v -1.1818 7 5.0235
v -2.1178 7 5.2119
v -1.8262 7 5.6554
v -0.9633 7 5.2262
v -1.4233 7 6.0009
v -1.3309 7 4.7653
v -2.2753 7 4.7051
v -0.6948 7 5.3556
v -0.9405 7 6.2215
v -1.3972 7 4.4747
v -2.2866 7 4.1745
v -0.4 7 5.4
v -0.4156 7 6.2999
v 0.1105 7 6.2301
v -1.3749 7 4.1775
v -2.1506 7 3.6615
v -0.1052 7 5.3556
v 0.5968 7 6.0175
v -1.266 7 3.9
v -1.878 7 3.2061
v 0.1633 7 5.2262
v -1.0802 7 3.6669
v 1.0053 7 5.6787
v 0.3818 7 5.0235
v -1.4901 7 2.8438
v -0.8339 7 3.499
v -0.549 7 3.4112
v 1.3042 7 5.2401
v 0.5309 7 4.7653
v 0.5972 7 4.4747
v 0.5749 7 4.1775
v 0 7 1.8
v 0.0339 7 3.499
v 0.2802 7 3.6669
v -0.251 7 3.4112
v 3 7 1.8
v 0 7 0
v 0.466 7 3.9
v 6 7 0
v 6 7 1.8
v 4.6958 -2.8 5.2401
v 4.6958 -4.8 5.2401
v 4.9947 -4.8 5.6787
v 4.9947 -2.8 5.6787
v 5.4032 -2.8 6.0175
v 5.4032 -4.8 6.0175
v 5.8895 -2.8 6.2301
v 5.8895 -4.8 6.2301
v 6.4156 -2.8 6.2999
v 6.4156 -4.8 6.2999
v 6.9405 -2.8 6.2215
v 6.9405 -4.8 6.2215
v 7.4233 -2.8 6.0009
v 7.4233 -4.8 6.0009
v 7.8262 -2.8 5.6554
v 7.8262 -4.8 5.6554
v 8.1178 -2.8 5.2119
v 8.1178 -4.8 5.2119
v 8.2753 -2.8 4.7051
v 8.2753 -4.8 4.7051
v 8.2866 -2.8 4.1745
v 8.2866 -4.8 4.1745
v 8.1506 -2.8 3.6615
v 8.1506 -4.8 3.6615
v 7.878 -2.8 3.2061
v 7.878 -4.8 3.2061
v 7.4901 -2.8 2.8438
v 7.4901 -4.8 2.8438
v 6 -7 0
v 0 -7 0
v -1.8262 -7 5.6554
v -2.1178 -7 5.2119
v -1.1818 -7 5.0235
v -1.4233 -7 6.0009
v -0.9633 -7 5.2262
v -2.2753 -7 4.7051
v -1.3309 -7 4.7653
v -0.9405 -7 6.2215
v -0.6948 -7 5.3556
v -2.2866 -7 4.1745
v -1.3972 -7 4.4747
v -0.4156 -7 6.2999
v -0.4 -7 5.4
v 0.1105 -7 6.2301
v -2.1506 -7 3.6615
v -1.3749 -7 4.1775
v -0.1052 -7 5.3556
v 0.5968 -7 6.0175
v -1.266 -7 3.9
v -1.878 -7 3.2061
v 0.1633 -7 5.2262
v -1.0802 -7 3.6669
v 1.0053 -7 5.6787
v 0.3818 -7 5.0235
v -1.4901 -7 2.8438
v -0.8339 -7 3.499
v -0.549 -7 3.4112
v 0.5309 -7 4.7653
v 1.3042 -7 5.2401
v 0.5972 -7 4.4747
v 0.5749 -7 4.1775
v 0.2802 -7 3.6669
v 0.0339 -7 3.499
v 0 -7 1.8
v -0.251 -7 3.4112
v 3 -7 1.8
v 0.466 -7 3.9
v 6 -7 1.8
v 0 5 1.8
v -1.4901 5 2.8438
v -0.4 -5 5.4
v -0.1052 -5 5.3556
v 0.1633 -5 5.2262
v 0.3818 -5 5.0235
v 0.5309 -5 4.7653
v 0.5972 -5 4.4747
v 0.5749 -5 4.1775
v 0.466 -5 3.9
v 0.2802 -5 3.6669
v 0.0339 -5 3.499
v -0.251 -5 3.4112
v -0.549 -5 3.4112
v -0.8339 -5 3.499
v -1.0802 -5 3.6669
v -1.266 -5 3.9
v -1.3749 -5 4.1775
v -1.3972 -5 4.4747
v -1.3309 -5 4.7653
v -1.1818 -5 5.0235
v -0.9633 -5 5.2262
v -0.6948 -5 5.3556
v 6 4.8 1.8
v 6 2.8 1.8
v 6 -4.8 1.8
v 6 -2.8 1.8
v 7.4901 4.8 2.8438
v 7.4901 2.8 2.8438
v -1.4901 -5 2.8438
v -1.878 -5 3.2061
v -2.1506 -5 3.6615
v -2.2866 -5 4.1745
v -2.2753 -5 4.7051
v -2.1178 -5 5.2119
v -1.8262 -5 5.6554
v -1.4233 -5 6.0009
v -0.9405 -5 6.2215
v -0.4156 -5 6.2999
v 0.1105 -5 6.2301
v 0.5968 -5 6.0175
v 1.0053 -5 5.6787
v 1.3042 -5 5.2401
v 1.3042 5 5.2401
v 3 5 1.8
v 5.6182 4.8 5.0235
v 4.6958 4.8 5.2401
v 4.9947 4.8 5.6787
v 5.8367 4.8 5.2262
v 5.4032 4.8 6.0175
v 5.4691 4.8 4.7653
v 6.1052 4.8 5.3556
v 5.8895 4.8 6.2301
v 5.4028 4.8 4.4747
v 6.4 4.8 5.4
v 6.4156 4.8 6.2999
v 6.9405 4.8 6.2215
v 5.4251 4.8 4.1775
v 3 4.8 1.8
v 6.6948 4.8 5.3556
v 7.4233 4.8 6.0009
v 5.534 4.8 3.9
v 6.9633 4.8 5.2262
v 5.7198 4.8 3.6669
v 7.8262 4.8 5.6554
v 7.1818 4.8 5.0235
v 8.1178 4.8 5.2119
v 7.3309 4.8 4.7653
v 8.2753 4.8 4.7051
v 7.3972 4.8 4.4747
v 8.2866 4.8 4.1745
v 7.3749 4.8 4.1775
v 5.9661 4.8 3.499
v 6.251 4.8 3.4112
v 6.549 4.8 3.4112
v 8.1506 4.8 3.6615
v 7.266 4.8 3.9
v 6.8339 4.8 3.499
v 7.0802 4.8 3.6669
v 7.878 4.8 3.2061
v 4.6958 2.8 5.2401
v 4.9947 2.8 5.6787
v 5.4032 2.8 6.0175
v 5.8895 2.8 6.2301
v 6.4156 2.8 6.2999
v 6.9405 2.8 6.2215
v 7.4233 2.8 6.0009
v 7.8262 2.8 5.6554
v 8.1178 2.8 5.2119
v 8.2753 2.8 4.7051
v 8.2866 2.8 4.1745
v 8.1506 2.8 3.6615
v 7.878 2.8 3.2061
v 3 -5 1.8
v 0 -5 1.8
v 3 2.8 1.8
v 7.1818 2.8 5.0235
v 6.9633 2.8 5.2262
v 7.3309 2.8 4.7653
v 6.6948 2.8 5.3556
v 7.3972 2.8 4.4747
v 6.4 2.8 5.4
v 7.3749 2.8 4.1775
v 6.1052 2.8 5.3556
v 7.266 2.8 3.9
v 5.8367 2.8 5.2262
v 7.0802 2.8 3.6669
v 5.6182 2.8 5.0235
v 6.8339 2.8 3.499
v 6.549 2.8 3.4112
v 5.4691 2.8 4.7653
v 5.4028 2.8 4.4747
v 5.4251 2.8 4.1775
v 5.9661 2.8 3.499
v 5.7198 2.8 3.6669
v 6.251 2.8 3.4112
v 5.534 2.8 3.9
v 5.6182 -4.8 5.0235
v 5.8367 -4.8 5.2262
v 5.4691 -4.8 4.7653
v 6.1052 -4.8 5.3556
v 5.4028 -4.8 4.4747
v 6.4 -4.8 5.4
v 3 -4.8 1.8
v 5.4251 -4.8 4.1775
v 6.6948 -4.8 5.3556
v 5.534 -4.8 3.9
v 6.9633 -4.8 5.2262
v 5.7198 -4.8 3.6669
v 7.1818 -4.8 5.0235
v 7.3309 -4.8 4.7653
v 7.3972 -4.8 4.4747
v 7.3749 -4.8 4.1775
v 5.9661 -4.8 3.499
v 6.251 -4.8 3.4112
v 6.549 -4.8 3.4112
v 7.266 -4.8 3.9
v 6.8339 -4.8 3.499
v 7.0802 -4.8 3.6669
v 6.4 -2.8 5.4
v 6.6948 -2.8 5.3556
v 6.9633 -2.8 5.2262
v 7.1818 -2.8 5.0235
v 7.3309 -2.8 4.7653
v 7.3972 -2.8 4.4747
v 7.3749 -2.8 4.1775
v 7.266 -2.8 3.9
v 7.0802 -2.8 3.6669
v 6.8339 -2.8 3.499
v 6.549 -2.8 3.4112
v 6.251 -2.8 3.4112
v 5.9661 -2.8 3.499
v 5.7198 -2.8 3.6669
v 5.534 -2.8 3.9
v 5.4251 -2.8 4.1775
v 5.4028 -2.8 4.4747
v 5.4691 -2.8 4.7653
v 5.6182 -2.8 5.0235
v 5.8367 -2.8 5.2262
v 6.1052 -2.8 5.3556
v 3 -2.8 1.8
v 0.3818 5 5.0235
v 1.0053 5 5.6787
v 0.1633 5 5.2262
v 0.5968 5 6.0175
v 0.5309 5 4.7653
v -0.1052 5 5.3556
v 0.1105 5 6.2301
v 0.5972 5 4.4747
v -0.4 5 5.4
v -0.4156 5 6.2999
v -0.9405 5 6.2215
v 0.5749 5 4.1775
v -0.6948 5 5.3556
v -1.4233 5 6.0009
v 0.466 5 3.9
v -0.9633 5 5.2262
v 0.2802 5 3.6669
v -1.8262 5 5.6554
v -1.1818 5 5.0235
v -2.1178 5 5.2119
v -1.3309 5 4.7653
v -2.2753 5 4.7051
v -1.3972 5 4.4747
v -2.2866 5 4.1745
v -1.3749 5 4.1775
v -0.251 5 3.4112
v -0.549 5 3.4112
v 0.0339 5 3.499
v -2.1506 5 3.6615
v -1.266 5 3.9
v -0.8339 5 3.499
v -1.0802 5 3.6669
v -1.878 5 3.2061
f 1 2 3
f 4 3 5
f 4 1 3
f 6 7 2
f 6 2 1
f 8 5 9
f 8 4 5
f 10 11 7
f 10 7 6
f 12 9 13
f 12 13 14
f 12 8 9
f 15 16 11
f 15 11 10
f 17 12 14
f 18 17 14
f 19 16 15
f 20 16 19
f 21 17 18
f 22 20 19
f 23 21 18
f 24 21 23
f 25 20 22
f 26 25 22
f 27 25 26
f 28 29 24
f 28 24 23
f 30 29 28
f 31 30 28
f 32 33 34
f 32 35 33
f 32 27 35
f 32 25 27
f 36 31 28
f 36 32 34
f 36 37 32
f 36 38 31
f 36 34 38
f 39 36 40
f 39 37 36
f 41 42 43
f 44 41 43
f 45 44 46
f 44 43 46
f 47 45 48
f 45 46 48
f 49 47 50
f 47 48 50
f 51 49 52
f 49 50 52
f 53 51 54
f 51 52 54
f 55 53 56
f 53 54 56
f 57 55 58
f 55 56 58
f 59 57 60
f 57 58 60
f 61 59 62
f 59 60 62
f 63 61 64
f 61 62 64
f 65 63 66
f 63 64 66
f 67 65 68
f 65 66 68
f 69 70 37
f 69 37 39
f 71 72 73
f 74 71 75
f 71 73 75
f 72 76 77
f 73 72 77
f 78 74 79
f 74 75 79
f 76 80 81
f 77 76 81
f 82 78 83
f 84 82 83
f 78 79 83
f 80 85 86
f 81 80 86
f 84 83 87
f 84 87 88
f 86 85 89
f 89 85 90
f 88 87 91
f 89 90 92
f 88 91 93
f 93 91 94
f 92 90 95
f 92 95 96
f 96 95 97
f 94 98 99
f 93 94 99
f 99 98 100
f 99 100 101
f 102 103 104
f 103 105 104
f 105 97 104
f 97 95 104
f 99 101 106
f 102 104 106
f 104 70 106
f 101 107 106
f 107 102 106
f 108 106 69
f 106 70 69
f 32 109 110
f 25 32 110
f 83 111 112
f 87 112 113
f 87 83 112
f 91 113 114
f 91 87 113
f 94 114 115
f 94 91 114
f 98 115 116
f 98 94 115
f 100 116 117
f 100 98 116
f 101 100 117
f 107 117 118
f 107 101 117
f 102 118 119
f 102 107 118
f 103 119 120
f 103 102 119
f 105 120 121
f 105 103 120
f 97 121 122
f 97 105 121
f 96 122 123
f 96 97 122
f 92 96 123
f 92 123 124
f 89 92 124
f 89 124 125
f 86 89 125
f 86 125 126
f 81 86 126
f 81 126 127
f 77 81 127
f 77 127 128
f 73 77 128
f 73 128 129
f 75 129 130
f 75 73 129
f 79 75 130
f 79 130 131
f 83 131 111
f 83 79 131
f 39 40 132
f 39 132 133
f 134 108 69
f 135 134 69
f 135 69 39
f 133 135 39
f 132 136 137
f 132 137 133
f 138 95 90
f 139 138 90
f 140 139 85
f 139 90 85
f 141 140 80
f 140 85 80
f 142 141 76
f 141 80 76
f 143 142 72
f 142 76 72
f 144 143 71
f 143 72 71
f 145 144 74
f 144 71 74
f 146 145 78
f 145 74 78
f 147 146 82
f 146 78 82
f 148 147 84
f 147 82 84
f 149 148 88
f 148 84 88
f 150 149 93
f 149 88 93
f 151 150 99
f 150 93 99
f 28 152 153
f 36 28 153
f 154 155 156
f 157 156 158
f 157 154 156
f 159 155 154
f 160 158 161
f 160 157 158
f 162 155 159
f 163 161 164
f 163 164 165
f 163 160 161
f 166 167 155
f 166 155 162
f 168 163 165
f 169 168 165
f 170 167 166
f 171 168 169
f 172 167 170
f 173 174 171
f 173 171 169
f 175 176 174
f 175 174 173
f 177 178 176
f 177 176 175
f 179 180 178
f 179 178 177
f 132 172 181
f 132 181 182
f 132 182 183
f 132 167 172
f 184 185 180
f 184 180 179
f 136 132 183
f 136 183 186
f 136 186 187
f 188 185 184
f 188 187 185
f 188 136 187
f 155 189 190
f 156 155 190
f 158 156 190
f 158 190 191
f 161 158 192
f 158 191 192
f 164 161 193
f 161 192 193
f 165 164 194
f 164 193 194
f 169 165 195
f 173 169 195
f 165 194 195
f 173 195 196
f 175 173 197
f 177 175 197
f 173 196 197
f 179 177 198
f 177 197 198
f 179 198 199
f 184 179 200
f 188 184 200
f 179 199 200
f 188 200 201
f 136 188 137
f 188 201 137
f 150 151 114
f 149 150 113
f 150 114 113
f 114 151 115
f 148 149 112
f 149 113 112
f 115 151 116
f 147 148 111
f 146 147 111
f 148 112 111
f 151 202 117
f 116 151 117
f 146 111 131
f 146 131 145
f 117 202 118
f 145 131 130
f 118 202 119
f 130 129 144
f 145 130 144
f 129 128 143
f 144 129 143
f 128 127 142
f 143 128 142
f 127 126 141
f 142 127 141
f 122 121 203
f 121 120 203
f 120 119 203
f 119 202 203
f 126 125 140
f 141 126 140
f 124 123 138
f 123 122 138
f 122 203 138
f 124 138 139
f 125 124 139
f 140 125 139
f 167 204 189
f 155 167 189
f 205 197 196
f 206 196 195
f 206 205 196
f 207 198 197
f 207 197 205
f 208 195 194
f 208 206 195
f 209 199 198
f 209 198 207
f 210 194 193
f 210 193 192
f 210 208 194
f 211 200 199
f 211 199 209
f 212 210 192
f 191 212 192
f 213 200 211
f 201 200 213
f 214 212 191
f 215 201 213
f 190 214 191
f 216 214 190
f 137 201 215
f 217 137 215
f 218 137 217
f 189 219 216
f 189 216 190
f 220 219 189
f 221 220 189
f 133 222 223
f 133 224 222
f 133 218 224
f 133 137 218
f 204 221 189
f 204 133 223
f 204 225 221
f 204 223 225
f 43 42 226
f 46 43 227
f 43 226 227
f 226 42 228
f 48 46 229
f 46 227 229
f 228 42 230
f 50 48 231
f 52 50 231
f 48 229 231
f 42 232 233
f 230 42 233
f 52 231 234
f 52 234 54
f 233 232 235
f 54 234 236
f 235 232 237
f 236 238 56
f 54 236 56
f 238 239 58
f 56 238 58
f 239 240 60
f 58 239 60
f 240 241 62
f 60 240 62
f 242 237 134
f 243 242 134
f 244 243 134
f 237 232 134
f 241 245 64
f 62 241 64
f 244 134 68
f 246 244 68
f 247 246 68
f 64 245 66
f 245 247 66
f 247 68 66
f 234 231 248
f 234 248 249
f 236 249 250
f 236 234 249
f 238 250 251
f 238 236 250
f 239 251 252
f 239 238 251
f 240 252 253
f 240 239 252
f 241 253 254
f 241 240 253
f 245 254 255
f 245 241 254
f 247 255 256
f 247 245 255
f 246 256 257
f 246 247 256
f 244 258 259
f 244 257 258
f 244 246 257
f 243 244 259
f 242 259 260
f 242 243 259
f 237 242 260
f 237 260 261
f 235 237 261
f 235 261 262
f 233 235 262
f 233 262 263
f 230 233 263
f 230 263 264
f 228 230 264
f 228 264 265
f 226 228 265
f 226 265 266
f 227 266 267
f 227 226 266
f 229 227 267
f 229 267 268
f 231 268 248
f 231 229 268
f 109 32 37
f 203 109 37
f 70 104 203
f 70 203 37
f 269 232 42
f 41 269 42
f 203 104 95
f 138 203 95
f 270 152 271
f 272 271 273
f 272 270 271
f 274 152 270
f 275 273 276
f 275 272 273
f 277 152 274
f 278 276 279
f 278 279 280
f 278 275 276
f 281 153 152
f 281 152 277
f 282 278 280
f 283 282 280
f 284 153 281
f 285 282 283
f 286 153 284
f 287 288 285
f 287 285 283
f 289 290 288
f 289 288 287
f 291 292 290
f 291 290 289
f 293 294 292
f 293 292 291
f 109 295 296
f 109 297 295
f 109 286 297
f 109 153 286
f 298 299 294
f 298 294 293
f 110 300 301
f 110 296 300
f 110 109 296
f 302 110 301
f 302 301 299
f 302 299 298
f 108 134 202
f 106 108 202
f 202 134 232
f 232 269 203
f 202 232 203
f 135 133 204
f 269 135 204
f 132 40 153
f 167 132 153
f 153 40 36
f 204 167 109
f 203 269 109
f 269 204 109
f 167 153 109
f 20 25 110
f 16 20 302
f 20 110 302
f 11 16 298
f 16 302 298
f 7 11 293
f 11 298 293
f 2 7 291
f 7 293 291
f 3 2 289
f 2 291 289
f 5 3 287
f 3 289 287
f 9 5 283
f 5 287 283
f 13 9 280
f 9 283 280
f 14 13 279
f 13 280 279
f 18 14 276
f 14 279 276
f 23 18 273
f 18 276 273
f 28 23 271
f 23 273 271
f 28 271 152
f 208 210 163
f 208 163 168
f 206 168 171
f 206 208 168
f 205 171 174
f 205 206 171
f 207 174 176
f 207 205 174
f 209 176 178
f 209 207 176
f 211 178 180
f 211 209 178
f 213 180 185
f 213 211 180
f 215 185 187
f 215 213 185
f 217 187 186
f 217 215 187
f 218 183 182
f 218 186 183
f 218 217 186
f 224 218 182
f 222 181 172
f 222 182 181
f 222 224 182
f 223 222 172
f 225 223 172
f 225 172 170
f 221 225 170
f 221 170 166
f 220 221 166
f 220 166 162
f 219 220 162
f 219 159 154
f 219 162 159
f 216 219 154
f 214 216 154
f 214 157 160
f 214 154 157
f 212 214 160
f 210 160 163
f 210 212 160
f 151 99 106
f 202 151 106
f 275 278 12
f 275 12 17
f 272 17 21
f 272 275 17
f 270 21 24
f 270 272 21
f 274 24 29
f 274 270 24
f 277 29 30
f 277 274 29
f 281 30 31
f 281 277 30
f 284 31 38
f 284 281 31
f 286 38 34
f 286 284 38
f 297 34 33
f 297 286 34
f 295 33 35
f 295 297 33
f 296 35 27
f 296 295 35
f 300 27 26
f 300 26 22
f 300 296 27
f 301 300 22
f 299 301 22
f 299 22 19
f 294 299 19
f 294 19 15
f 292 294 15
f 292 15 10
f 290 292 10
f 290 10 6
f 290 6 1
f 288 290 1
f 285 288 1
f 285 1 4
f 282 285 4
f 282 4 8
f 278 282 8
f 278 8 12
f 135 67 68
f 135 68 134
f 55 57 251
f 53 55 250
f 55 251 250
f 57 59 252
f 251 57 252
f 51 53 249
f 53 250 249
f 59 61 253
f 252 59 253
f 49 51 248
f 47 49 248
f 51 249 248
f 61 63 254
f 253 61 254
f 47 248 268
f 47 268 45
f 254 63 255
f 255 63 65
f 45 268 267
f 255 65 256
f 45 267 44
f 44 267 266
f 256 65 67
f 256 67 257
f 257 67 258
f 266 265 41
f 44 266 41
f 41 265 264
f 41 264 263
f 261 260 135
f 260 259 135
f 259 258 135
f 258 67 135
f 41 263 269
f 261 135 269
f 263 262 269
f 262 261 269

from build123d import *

# Parameters (mm, degrees)
EXTRUDE_1_DEPTH          = 7
EXTRUDE_1_DEPTH_BACK     = 7
SKETCH_1_R               = 1
CUT_EXTRUDE_1_DEPTH      = 5
CUT_EXTRUDE_1_DEPTH_BACK = 5
CUT_EXTRUDE_2_DEPTH      = 2.8
CUT_EXTRUDE_2_DEPTH_BACK = 2.8
CUT_EXTRUDE_START        = -2.2
CUT_EXTRUDE_3_DEPTH      = 2.2


with BuildPart() as part:
    # 草图1 → 凸台-拉伸1 (new, two sides: drawn at the far end of the back side and taken through both)
    with BuildSketch(Plane(origin=(0, 0, 0), x_dir=(1, 0, 0), z_dir=(0, 1, 0)).offset(-EXTRUDE_1_DEPTH_BACK)):
        with BuildLine():
            Line((1.304185983, -5.240089362), (3, -1.8))
            Line((3, -1.8), (4.695814017, -5.240089362))
            ThreePointArc((4.695814017, -5.240089362), (7.636846117, -5.842293896), (7.490107264, -2.843829652))
            Line((7.490107264, -2.843829652), (6, -1.8))
            Line((6, -1.8), (6, 0))
            Line((6, 0), (0, 0))
            Line((0, 0), (0, -1.8))
            Line((0, -1.8), (-1.490107264, -2.843829652))
            ThreePointArc((-1.490107264, -2.843829652), (-1.636846117, -5.842293896), (1.304185983, -5.240089362))
        make_face()
        with Locations((-0.4, -4.4)):
            Circle(SKETCH_1_R, mode=Mode.SUBTRACT)
        with Locations((6.4, -4.4)):
            Circle(SKETCH_1_R, mode=Mode.SUBTRACT)
    extrude(amount=EXTRUDE_1_DEPTH + EXTRUDE_1_DEPTH_BACK)

    # 草图2 → 切除-拉伸1 (cut, two sides: drawn at the far end of the back side and taken through both)
    with BuildSketch(Plane(origin=(0, 0, 0), x_dir=(1, 0, 0), z_dir=(0, 1, 0)).offset(-CUT_EXTRUDE_1_DEPTH_BACK)):
        with BuildLine():
            Line((0, -1.8), (3, -1.8))
            Line((3, -1.8), (1.304185983, -5.240089362))
            ThreePointArc((1.304185983, -5.240089362), (-1.636846117, -5.842293896), (-1.490107264, -2.843829652))
            Line((-1.490107264, -2.843829652), (0, -1.8))
        make_face()
    extrude(amount=CUT_EXTRUDE_1_DEPTH + CUT_EXTRUDE_1_DEPTH_BACK, mode=Mode.SUBTRACT)

    # 草图3 → 切除-拉伸2 (cut, two sides: drawn at the far end of the back side and taken through both)
    with BuildSketch(Plane(origin=(0, 0, 0), x_dir=(1, 0, 0), z_dir=(0, 1, 0)).offset(-CUT_EXTRUDE_2_DEPTH_BACK)):
        with BuildLine():
            Line((4.695814017, -5.240089362), (3, -1.8))
            Line((3, -1.8), (6, -1.8))
            Line((6, -1.8), (7.490107264, -2.843829652))
            ThreePointArc((7.490107264, -2.843829652), (7.636846117, -5.842293896), (4.695814017, -5.240089362))
        make_face()
    extrude(amount=CUT_EXTRUDE_2_DEPTH + CUT_EXTRUDE_2_DEPTH_BACK, mode=Mode.SUBTRACT)

    # 草图4 → 切除-拉伸3 (cut)
    with BuildSketch(Plane(origin=(0, 7, 0), x_dir=(1, 0, 0), z_dir=(0, 1, 0)).offset(CUT_EXTRUDE_START)):
        with BuildLine():
            Line((7.490107264, -2.843829652), (6, -1.8))
            Line((6, -1.8), (3, -1.8))
            Line((3, -1.8), (4.695814017, -5.240089362))
            ThreePointArc((4.695814017, -5.240089362), (7.636846117, -5.842293896), (7.490107264, -2.843829652))
        make_face()
    cut_extrude_3 = extrude(amount=CUT_EXTRUDE_3_DEPTH, mode=Mode.SUBTRACT)

    # 镜向1: 切除-拉伸3 across plane
    add(cut_extrude_3.mirror(Plane.ZX), mode=Mode.SUBTRACT)


solid = part.part
